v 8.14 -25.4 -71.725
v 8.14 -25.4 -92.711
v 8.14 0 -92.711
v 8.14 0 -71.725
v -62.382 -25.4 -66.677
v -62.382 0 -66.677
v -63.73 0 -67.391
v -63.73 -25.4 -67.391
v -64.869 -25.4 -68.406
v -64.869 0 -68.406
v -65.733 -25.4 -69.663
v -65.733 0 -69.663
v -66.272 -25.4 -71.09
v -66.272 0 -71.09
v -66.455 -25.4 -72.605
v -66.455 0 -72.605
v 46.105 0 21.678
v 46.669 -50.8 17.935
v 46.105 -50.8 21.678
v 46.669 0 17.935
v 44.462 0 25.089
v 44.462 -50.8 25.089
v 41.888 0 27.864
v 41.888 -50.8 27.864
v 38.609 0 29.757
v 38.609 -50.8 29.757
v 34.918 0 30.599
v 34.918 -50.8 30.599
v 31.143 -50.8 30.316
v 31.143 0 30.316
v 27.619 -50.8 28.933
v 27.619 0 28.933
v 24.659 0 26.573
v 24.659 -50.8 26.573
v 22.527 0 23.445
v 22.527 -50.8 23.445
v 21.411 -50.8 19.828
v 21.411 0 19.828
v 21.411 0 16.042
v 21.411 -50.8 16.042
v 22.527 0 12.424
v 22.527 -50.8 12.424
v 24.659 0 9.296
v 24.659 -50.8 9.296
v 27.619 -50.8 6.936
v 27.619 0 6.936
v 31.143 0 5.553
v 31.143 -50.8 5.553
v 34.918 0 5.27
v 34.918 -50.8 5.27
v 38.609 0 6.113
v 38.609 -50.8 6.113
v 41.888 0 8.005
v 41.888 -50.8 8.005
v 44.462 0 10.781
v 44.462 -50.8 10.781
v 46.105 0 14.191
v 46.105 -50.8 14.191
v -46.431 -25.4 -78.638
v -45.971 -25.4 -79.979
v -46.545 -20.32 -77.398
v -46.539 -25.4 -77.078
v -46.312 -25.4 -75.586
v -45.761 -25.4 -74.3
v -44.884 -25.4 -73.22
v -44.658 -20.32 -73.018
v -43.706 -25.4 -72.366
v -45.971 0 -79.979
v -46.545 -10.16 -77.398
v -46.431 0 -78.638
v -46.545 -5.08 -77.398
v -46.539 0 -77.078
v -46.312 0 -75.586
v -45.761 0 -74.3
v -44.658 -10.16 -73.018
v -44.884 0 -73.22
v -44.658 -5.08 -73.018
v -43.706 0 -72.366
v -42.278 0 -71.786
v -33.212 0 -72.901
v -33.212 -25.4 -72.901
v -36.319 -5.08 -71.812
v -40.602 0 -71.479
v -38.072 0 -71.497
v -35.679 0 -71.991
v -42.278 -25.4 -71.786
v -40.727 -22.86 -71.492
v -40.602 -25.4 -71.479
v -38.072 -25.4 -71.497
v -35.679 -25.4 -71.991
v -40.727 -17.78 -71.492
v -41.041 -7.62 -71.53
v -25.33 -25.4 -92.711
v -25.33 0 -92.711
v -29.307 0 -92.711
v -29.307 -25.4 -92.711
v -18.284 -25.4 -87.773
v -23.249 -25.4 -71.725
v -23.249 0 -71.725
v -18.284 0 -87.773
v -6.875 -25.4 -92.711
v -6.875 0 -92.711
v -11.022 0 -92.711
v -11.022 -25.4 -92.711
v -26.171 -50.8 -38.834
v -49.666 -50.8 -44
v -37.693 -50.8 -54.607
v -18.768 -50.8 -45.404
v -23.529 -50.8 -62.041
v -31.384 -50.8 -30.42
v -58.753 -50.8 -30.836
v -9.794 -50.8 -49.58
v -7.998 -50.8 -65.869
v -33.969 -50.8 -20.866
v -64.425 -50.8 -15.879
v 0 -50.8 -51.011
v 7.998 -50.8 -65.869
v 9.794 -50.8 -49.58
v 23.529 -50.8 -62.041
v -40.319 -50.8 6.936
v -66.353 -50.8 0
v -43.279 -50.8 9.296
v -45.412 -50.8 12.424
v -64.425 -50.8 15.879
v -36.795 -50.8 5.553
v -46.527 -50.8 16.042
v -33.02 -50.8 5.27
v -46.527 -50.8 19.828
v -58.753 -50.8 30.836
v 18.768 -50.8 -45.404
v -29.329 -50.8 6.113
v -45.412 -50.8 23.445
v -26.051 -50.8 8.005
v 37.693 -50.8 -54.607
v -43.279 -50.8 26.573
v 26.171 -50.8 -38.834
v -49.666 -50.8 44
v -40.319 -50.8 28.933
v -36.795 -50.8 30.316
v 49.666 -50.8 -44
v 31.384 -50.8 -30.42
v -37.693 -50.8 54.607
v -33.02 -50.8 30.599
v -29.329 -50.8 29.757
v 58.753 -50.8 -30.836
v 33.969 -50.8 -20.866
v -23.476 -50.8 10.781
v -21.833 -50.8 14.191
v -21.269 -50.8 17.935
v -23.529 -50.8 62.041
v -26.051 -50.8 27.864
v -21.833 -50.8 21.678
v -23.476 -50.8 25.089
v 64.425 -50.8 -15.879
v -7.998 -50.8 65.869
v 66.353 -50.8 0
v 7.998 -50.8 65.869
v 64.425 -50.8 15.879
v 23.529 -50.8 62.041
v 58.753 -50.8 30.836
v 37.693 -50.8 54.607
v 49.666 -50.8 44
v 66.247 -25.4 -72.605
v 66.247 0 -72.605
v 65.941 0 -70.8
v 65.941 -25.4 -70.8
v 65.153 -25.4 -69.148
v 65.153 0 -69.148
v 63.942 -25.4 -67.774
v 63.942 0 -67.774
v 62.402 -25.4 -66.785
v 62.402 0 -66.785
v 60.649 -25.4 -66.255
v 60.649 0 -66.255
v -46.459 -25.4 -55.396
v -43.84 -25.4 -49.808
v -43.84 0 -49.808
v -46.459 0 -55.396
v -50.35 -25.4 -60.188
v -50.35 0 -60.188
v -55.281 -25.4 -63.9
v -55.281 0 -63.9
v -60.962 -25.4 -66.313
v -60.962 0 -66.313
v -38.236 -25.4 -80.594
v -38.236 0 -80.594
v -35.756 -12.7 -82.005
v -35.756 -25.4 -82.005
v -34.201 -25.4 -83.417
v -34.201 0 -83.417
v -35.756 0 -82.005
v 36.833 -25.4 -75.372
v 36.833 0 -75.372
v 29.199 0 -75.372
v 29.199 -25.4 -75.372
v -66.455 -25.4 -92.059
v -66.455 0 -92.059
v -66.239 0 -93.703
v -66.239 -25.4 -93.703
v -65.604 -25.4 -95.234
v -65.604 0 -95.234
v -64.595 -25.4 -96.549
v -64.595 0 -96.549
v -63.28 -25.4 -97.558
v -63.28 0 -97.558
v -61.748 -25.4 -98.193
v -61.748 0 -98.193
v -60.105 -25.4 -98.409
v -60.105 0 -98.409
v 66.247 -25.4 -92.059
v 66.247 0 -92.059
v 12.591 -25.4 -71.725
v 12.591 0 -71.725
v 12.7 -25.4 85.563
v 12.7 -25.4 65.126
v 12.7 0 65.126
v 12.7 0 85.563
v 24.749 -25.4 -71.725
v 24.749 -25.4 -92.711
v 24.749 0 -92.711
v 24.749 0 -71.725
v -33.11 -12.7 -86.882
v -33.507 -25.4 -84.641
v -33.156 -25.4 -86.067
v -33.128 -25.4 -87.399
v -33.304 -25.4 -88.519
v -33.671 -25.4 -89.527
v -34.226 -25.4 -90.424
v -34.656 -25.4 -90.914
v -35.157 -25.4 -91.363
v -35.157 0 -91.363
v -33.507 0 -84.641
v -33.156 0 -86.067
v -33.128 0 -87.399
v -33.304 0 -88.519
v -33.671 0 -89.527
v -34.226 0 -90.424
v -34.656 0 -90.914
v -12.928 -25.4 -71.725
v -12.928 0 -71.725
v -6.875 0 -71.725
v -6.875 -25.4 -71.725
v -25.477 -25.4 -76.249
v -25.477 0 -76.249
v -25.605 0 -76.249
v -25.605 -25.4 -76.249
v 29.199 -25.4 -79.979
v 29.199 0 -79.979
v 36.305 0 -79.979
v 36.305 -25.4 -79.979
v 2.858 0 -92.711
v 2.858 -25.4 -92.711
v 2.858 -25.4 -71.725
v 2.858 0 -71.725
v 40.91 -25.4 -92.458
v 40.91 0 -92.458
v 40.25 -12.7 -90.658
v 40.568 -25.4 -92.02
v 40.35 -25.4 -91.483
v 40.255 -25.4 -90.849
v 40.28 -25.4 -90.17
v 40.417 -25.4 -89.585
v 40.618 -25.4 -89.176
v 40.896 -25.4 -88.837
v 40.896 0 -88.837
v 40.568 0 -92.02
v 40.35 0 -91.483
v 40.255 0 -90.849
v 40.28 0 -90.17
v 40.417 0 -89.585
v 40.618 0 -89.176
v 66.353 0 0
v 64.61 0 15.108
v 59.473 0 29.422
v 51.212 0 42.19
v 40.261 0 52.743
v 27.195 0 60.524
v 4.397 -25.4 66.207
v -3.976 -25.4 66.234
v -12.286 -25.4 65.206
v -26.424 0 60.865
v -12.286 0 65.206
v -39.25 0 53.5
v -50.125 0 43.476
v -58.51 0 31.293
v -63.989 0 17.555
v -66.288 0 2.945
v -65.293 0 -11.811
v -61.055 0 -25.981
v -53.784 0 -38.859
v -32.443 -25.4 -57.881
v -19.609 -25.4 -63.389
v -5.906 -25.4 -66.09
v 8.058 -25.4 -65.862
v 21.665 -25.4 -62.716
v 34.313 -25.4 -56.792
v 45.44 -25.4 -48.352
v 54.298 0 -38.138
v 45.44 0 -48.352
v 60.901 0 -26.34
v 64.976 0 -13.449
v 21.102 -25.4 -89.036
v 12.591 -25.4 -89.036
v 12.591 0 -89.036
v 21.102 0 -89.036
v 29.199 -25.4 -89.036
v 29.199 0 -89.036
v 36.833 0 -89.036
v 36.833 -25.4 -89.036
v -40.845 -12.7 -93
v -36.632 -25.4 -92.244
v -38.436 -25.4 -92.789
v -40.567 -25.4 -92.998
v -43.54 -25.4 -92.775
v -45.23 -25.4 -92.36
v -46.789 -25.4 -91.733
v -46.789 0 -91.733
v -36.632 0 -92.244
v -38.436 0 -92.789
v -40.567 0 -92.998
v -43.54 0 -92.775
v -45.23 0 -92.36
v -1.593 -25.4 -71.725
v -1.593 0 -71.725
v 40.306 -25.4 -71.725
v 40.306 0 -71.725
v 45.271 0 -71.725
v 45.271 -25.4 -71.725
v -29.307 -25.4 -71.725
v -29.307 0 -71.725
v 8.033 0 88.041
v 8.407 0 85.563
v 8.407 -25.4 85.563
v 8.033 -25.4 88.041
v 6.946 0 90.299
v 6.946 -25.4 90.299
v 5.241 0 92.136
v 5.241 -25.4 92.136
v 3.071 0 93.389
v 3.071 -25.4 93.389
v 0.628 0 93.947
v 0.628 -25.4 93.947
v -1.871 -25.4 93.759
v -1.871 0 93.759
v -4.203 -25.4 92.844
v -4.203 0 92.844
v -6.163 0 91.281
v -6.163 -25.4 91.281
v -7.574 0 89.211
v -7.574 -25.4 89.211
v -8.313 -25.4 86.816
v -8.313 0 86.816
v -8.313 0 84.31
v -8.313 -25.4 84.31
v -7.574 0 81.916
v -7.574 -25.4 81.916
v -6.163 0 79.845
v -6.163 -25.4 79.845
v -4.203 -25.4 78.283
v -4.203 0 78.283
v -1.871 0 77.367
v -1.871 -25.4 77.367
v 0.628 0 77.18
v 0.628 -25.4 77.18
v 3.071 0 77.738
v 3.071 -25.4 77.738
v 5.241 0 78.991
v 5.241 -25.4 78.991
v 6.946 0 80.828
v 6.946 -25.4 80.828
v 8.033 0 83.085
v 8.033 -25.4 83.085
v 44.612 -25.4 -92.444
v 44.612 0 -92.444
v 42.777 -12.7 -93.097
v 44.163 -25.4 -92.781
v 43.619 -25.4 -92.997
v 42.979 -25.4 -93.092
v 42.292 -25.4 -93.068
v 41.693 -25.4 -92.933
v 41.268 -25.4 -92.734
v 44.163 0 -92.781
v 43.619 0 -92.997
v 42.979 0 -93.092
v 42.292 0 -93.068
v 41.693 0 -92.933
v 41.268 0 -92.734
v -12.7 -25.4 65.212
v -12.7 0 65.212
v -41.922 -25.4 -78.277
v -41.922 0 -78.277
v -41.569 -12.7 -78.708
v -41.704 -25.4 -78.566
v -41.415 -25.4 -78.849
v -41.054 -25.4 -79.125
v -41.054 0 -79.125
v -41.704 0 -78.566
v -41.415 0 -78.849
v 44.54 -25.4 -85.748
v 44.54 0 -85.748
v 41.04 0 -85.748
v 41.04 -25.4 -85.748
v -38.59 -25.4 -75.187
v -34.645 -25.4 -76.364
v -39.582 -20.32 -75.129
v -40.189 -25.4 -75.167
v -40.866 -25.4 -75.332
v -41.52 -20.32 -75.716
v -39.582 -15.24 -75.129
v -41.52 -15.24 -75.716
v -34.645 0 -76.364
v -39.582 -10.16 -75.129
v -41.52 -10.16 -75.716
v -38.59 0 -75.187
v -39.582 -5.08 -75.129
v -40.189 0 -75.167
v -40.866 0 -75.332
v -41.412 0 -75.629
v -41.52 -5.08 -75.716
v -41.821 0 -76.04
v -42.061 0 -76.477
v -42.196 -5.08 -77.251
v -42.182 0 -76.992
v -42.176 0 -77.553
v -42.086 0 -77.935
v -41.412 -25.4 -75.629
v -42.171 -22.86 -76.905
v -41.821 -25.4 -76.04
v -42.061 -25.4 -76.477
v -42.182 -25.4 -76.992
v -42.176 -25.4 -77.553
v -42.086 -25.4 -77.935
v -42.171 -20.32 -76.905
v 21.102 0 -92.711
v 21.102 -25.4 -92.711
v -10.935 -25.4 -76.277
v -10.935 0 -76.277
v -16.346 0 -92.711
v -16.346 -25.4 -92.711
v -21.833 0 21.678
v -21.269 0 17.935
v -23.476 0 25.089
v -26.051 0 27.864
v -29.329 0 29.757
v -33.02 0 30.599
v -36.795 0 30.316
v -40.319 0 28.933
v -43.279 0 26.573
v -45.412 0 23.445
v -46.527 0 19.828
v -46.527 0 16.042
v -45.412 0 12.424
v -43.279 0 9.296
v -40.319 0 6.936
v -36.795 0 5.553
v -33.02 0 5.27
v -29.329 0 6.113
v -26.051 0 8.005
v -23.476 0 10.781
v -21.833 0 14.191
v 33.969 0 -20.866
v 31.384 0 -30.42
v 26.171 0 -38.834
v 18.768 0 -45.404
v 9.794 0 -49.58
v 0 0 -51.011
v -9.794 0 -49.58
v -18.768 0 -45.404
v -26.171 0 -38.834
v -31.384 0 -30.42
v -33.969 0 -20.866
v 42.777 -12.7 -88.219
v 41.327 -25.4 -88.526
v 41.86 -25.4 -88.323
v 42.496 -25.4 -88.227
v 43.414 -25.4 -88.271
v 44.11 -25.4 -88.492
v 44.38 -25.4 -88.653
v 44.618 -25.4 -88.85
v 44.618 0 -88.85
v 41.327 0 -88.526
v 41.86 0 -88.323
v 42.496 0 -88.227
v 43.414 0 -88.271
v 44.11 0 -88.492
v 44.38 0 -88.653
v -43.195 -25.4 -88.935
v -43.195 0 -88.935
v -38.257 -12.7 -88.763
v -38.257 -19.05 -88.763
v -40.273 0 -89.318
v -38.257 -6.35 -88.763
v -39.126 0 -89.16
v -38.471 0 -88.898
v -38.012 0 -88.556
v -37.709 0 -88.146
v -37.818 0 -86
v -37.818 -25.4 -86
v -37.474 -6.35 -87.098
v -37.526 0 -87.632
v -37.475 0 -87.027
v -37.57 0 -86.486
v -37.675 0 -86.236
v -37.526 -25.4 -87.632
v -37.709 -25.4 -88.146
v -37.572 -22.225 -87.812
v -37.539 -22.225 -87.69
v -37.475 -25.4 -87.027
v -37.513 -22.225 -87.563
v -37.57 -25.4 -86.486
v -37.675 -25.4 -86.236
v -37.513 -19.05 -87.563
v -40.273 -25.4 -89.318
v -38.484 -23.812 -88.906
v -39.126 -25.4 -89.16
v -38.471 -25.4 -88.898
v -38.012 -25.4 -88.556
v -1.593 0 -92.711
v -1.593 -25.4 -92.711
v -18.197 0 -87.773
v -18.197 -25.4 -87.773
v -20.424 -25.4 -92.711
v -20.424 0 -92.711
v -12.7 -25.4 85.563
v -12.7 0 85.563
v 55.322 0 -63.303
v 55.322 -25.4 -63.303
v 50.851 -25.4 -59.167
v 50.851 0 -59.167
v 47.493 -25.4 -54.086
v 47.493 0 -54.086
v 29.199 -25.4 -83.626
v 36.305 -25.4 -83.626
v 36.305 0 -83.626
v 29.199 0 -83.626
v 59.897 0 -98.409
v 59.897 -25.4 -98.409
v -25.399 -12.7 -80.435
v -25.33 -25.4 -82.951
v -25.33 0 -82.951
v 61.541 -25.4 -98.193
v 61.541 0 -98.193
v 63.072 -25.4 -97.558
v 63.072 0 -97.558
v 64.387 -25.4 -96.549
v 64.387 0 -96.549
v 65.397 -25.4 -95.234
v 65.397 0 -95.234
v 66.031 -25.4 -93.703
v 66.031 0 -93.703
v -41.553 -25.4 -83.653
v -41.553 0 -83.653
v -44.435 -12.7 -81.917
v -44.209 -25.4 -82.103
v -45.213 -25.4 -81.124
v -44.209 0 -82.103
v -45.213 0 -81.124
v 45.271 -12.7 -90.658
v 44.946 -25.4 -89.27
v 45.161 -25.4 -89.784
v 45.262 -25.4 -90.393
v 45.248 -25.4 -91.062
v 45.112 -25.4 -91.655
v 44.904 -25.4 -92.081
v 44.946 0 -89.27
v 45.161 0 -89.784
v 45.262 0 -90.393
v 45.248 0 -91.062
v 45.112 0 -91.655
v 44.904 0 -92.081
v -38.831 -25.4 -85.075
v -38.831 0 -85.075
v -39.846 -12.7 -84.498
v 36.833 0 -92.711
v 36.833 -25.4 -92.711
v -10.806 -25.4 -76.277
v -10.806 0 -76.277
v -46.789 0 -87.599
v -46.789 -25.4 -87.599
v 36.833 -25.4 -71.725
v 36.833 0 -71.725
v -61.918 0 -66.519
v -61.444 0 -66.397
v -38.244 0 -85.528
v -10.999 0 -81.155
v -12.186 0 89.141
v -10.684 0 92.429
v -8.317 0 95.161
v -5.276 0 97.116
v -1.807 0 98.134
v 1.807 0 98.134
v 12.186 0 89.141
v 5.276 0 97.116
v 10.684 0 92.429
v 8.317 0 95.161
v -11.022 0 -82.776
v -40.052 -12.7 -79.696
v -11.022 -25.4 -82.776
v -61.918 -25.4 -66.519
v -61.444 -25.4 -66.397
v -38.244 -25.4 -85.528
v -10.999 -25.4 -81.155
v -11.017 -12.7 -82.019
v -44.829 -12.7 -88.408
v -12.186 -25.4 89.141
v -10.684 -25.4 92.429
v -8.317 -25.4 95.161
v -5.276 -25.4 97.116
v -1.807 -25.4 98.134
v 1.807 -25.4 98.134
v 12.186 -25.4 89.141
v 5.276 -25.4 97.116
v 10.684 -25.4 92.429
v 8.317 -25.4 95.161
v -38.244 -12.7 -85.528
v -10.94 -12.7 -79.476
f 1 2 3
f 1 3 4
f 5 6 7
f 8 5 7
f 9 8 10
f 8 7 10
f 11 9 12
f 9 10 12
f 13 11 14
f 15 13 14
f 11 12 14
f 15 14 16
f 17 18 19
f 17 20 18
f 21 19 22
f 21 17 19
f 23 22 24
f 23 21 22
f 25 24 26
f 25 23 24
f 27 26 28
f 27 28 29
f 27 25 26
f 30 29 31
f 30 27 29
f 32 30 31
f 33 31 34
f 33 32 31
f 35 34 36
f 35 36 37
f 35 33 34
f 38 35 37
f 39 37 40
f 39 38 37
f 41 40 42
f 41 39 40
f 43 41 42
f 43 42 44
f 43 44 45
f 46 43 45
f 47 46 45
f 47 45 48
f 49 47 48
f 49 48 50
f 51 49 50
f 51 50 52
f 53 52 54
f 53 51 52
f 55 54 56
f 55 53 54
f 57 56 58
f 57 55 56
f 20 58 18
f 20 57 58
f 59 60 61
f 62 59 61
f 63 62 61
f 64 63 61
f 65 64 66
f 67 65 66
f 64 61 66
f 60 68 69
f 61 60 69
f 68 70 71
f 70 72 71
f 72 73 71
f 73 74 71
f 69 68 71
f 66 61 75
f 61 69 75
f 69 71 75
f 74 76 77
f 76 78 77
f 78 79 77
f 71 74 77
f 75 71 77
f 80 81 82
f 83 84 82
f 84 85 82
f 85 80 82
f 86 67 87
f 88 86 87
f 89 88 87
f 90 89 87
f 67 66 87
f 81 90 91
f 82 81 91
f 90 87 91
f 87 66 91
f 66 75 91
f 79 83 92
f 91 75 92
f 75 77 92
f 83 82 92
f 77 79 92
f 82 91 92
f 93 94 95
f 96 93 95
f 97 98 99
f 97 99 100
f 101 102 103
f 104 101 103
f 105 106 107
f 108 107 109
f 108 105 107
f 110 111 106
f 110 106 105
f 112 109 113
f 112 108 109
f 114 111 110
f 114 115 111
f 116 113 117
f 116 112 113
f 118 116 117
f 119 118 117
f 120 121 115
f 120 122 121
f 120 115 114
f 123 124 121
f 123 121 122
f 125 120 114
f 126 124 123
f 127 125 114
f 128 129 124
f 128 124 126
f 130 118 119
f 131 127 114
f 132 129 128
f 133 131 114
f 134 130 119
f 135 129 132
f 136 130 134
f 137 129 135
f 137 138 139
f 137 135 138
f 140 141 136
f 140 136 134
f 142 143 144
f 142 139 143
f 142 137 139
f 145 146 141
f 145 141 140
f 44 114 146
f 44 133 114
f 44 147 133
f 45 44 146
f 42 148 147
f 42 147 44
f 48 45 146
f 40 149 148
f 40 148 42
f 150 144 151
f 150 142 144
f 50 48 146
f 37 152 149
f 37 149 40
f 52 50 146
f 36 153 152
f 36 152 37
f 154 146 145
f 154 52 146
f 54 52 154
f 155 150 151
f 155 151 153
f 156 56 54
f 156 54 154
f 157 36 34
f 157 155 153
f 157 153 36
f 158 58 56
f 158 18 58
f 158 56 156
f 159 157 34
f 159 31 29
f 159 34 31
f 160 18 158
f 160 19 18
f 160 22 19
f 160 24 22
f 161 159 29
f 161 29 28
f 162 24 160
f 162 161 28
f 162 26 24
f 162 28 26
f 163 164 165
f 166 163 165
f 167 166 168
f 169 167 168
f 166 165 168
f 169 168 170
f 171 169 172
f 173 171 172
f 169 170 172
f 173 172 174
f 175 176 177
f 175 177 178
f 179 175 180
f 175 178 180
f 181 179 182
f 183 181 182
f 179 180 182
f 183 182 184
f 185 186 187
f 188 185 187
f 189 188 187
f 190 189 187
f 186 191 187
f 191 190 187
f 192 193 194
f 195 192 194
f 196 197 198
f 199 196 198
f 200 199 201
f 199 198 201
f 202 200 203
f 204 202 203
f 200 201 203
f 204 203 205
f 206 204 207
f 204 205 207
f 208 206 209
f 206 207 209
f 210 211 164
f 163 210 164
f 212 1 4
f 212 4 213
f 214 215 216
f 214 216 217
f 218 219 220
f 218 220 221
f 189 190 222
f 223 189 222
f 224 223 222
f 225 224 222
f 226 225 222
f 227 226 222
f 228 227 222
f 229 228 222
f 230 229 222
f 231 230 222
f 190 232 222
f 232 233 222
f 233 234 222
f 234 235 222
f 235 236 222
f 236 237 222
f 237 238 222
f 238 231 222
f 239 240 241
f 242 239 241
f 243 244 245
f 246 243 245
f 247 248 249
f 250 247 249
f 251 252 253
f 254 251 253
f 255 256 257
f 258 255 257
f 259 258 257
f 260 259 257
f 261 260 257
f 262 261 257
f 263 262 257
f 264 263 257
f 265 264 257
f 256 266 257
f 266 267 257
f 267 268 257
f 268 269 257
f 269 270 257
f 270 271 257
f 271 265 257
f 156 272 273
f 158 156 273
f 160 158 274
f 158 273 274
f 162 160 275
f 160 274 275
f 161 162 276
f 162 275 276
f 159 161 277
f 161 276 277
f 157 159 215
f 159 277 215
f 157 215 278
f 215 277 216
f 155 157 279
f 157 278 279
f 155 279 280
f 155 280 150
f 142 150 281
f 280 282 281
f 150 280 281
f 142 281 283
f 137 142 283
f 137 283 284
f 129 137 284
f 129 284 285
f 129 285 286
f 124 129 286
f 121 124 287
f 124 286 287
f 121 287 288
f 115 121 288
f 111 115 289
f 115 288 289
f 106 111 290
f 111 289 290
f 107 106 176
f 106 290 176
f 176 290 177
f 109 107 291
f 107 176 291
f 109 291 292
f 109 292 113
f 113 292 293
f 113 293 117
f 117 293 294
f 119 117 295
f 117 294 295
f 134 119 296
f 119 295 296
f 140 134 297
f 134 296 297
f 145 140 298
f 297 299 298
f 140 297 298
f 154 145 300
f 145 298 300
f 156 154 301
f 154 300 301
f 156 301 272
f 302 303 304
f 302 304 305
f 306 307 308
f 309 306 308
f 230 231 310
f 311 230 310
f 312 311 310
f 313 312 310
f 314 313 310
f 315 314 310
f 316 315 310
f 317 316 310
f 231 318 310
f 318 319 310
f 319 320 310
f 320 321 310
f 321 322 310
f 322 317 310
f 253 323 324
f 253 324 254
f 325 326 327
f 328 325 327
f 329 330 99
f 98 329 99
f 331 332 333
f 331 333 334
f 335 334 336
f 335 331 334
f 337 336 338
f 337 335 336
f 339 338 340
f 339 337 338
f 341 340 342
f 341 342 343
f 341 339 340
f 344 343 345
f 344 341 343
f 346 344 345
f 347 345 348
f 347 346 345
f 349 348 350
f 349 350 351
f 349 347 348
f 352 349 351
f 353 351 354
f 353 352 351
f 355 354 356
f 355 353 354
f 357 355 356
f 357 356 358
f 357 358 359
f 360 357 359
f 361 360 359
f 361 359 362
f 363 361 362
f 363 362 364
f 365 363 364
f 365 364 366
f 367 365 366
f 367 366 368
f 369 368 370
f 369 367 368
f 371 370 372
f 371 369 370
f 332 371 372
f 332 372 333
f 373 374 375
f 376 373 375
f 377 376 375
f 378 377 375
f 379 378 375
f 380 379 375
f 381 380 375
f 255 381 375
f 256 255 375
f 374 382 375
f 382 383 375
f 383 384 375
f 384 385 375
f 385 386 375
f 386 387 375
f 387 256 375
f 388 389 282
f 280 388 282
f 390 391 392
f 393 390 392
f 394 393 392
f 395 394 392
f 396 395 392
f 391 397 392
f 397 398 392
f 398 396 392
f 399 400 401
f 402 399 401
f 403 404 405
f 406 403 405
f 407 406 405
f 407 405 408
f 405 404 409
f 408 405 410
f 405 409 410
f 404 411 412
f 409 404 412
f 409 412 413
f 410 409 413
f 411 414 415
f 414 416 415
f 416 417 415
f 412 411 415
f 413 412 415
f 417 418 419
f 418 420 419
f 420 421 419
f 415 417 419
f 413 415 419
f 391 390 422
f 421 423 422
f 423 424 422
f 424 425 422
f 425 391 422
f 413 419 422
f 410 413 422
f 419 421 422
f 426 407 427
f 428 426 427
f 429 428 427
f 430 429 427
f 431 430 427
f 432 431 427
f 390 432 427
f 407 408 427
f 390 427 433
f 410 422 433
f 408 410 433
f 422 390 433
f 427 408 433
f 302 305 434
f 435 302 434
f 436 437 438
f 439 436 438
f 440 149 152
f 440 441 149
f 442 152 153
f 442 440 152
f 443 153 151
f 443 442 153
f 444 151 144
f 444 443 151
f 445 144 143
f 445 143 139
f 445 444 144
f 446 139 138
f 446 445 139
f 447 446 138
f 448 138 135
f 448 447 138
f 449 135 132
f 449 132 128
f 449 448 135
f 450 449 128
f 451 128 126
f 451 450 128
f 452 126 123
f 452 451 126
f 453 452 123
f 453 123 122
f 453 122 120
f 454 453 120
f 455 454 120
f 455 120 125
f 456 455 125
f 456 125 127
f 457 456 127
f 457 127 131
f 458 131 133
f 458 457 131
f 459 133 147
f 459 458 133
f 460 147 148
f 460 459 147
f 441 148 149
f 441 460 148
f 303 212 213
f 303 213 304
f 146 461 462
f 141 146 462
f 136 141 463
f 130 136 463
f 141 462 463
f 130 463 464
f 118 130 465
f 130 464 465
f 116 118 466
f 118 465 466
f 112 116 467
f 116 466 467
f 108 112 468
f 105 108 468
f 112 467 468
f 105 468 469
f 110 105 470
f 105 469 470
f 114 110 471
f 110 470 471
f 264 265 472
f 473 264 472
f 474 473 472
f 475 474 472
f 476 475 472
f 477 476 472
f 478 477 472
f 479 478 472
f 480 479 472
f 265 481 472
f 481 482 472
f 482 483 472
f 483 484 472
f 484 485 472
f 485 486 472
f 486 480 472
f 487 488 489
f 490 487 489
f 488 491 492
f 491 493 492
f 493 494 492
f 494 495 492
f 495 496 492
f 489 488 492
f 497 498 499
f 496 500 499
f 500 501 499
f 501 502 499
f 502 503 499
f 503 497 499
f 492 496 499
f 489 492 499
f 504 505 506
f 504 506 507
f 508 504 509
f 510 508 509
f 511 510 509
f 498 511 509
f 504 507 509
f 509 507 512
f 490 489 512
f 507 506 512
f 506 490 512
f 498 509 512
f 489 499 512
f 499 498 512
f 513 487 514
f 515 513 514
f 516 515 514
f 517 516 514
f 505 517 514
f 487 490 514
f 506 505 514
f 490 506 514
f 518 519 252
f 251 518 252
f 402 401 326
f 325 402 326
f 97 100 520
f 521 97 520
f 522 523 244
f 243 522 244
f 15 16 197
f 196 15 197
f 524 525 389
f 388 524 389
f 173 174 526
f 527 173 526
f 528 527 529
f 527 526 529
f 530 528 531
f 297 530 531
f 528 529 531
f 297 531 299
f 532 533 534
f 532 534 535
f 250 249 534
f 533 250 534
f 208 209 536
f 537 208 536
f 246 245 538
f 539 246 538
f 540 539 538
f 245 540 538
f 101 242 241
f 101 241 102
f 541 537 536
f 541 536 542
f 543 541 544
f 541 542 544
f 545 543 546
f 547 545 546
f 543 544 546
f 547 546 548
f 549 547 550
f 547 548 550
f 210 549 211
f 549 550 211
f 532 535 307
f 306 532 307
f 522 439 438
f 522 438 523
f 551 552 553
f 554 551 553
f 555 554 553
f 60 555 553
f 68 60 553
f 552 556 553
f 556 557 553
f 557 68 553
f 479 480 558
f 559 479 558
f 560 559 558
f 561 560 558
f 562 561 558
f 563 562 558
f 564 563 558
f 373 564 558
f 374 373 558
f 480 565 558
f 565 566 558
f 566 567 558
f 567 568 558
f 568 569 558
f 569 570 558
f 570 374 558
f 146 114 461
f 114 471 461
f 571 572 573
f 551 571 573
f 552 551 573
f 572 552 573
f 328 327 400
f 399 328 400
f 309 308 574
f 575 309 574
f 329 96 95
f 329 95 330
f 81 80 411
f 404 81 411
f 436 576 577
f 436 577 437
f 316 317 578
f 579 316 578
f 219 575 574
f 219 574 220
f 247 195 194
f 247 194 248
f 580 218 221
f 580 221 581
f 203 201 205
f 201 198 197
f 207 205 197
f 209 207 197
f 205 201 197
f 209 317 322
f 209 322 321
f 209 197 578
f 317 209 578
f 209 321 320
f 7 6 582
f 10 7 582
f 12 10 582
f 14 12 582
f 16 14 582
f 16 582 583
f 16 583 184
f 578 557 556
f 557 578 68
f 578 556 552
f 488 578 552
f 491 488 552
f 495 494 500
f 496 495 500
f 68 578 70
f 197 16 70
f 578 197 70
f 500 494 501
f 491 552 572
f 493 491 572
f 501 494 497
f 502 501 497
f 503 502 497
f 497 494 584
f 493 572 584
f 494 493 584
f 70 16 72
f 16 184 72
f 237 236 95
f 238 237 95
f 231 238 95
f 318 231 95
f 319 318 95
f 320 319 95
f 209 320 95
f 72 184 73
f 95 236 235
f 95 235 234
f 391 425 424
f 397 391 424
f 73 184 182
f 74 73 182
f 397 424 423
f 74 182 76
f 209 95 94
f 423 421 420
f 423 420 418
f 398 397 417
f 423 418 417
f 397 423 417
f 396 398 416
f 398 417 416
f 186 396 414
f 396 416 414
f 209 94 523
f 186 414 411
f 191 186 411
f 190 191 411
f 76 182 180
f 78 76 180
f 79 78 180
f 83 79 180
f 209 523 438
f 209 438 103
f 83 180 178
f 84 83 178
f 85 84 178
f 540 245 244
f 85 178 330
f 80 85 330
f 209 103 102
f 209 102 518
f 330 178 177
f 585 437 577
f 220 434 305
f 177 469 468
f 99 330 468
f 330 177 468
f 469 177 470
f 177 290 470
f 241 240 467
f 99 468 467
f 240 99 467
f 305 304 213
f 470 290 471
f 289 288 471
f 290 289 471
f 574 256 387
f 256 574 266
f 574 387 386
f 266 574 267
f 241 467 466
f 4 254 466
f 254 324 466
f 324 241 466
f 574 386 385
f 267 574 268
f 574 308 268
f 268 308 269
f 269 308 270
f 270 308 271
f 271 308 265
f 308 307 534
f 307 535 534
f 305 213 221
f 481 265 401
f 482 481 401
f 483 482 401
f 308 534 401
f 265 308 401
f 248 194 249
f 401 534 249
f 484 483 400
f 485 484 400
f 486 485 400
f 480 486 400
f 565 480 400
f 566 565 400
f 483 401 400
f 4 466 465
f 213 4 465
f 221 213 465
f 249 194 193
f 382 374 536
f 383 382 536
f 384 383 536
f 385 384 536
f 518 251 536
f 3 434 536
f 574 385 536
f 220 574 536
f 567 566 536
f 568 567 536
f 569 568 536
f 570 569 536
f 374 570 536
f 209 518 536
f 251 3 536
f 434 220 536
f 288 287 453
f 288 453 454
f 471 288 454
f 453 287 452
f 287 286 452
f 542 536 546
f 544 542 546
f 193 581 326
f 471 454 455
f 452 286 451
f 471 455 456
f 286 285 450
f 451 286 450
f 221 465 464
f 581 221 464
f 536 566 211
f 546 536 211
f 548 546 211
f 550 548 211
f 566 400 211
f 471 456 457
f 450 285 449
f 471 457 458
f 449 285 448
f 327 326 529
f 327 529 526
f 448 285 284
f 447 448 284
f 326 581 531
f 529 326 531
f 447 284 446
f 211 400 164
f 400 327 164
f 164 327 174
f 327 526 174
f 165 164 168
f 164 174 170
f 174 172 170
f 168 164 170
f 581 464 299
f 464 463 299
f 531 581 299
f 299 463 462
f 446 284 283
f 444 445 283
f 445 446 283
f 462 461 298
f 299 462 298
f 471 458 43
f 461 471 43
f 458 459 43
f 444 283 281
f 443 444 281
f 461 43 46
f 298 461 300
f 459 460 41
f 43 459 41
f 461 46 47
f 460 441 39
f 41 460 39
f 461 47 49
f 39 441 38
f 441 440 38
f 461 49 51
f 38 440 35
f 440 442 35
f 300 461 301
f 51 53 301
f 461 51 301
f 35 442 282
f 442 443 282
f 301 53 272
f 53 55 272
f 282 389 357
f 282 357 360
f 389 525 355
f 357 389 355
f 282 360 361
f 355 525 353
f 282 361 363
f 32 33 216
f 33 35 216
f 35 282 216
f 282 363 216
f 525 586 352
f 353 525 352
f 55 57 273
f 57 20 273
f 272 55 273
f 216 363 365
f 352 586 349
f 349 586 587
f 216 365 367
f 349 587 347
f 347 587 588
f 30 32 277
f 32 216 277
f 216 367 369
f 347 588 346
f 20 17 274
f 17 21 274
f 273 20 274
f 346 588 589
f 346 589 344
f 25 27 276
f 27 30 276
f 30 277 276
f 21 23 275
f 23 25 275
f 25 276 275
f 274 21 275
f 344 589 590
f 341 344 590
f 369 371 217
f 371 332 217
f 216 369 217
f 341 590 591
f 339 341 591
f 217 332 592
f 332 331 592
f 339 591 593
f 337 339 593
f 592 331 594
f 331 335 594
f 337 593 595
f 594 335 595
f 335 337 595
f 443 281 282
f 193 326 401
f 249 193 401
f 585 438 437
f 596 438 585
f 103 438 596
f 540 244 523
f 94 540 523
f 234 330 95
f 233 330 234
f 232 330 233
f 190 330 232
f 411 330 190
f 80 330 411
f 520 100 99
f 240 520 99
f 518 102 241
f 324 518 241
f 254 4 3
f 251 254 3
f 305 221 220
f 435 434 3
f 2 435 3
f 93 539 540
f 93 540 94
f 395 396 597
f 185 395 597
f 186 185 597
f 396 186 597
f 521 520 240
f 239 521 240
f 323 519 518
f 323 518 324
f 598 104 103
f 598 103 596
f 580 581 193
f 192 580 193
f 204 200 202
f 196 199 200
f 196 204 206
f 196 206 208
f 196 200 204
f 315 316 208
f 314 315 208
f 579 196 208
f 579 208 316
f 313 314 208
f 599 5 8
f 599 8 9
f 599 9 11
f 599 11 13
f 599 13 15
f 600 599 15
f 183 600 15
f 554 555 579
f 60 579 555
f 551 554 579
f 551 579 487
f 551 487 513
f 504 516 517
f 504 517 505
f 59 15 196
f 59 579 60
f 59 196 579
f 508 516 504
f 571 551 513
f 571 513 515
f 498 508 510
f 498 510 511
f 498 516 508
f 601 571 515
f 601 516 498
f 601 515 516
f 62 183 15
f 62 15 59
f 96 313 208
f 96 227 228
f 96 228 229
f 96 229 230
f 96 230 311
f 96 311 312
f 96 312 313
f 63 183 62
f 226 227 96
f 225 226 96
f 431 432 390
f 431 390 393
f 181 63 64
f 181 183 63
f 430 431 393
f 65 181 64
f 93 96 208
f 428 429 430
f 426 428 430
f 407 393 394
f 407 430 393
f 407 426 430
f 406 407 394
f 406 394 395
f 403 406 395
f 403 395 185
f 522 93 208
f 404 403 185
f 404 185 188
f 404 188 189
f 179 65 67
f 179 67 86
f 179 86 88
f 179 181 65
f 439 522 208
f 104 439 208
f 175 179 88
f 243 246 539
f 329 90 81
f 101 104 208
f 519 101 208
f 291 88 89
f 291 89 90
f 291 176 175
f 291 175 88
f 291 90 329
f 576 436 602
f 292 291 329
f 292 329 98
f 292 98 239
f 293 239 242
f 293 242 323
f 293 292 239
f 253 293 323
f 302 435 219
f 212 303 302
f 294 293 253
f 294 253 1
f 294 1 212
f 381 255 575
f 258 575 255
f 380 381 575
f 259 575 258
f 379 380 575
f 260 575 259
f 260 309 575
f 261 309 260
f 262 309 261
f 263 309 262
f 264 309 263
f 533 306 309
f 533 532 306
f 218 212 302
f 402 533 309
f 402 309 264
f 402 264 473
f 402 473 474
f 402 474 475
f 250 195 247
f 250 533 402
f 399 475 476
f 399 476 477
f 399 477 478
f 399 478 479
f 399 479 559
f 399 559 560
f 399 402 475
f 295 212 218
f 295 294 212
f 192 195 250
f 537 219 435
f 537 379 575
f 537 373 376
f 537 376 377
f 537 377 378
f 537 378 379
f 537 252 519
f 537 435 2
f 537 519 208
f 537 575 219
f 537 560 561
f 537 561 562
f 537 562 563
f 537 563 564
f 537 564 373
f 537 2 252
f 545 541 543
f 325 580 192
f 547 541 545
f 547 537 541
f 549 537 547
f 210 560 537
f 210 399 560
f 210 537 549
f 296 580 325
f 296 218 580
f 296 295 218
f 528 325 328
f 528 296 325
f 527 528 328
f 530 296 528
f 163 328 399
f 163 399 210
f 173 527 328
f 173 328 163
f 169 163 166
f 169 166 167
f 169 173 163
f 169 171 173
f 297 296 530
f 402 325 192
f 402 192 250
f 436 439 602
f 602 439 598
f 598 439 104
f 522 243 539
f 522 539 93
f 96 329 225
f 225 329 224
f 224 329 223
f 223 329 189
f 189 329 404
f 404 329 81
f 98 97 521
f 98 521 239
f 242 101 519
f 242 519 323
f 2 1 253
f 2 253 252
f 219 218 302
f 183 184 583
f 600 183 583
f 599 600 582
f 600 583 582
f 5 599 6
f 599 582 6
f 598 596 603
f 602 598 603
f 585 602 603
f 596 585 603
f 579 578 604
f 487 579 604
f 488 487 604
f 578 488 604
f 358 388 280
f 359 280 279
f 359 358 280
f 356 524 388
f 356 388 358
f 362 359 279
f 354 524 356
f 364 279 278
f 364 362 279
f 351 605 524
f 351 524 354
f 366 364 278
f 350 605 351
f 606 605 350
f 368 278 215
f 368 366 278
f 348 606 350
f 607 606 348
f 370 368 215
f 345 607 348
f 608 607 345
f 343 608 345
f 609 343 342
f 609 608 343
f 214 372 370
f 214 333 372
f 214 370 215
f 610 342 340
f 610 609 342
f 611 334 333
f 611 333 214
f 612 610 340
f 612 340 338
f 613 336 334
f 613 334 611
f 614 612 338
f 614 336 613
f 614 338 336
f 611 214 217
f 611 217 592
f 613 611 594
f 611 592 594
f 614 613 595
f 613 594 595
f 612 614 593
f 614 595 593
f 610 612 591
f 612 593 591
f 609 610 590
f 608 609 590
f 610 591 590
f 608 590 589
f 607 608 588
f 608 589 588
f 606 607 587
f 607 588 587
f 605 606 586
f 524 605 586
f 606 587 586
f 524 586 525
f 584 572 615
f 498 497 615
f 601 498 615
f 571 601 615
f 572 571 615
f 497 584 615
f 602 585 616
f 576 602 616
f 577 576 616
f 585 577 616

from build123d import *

# Parameters (mm, degrees)
F0_R         = 66.3530558333
F0_R_2       = 12.7
F1_DEPTH     = 25.4
F1_FACE_R    = 66.3530558333
F1_FACE_R_2  = 12.7
F1_FACE1_R   = 66.3530558333
F1_FACE1_R_2 = 12.7
F2_W         = 4.4507078564
F2_H         = 20.9858454036
F2_R         = 8.4066819866
F3_DEPTH     = 25.4


with BuildPart() as f1:
    # F0 (on Front) → F1 (new body)
    with BuildSketch(Plane.XZ):
        Circle(F0_R)
        with BuildLine():
            ThreePointArc((33.9692530815, -20.8659172058), (0, -51.0114037039), (-33.9692530815, -20.8659172058))
            Line((-33.9692530815, -20.8659172058), (33.9692530815, -20.8659172058))
        make_face(mode=Mode.SUBTRACT)
        with Locations((-33.9692530815, 17.9346787966)):
            Circle(F0_R_2, mode=Mode.SUBTRACT)
        with Locations((33.9692530815, 17.9346787966)):
            Circle(F0_R_2, mode=Mode.SUBTRACT)
    extrude(amount=F1_DEPTH)

    # F1_face (on face) + F1_face1 (on face) + F2 (on Front) → F3 (join)
    with BuildSketch(Plane(origin=(0, -25.4, 3.0362688443), x_dir=(1, 0, 0), z_dir=(0, -1, 0))):
        with Locations((0, -3.0362688443)):
            Circle(F1_FACE_R)
        with BuildLine():
            Line((-33.9692530815, -23.9021860501), (33.9692530815, -23.9021860501))
            ThreePointArc((33.9692530815, -23.9021860501), (0, -54.0476725482), (-33.9692530815, -23.9021860501))
        make_face(mode=Mode.SUBTRACT)
        with Locations((-33.9692530815, 14.8984099523)):
            Circle(F1_FACE_R_2, mode=Mode.SUBTRACT)
        with Locations((33.9692530815, 14.8984099523)):
            Circle(F1_FACE_R_2, mode=Mode.SUBTRACT)
    with BuildSketch(Plane(origin=(0, 0, 3.0362688443), x_dir=(1, 0, 0), z_dir=(0, 1, 0))):
        with Locations((0, 3.0362688443)):
            Circle(F1_FACE1_R)
        with BuildLine():
            Line((33.9692530815, 23.9021860501), (-33.9692530815, 23.9021860501))
            ThreePointArc((-33.9692530815, 23.9021860501), (0, 54.0476725482), (33.9692530815, 23.9021860501))
        make_face(mode=Mode.SUBTRACT)
        with Locations((-33.9692530815, -14.8984099523)):
            Circle(F1_FACE1_R_2, mode=Mode.SUBTRACT)
        with Locations((33.9692530815, -14.8984099523)):
            Circle(F1_FACE1_R_2, mode=Mode.SUBTRACT)
    with BuildSketch(Plane.XZ):
        with BuildLine():
            ThreePointArc((-62.3816600836, -66.6768364352), (-65.3384644923, -69.0084552345), (-66.4549320936, -72.6046530366))
            Line((-66.4549320936, -72.6046530366), (-66.4549320936, -92.0591460705))
            ThreePointArc((-66.4549320936, -92.0591460705), (-64.5950601542, -96.549274131), (-60.1049320936, -98.4091460705))
            Line((-60.1049320936, -98.4091460705), (59.8973428065, -98.4091460705))
            ThreePointArc((59.8973428065, -98.4091460705), (64.387470867, -96.549274131), (66.2473428065, -92.0591460705))
            Line((66.2473428065, -92.0591460705), (66.2473428065, -72.6046530366))
            ThreePointArc((66.2473428065, -72.6046530366), (64.5949199756, -68.4188649341), (60.649351561, -66.2546530366))
            Line((60.649351561, -66.2546530366), (58.6019530892, -66.2546530366))
            Line((58.6019530892, -66.2546530366), (-60.1049320936, -66.2546530366))
            ThreePointArc((-60.1049320936, -66.2546530366), (-60.5342273612, -66.2691810279), (-60.9615582829, -66.3126985253))
            ThreePointArc((-60.9615582829, -66.3126985253), (-61.6689814595, -66.5050153427), (-62.3816600836, -66.6768364352))
        make_face()
        with BuildLine():
            add(Edge.make_bspline(
                [(-34.2013412228, -83.4167571957), (-33.1104814541, -84.8291335278), (-33.1104814541, -86.8822464399)],
                knots=[0, 0, 0, 1, 1, 1], degree=2))
            add(Edge.make_bspline(
                [(-33.1104814541, -86.8822464399), (-33.1104814541, -89.7253714793), (-35.1567047255, -91.3628094058)],
                knots=[0, 0, 0, 1, 1, 1], degree=2))
            add(Edge.make_bspline(
                [(-35.1567047255, -91.3628094058), (-37.202927997, -93.0002473324), (-40.8452513511, -93.0002473324)],
                knots=[0, 0, 0, 1, 1, 1], degree=2))
            add(Edge.make_bspline(
                [(-40.8452513511, -93.0002473324), (-44.2073959857, -93.0002473324), (-46.7887146806, -91.7325534538)],
                knots=[0, 0, 0, 1, 1, 1], degree=2))
            Line((-46.7887146806, -91.7325534538), (-46.7887146806, -87.598769067))
            add(Edge.make_bspline(
                [(-46.7887146806, -87.598769067), (-44.666705362, -88.5495394759), (-43.194618811, -88.935359352)],
                knots=[0, 0, 0, 1, 1, 1], degree=2))
            add(Edge.make_bspline(
                [(-43.194618811, -88.935359352), (-41.7225322599, -89.3211792281), (-40.5007693189, -89.3211792281)],
                knots=[0, 0, 0, 1, 1, 1], degree=2))
            add(Edge.make_bspline(
                [(-40.5007693189, -89.3211792281), (-39.0401655022, -89.3211792281), (-38.2570430156, -88.7631183359)],
                knots=[0, 0, 0, 1, 1, 1], degree=2))
            add(Edge.make_bspline(
                [(-38.2570430156, -88.7631183359), (-37.473920529, -88.2050574437), (-37.473920529, -87.0981218468)],
                knots=[0, 0, 0, 1, 1, 1], degree=2))
            add(Edge.make_bspline(
                [(-37.473920529, -87.0981218468), (-37.473920529, -86.4826472825), (-37.8184025612, -86.0003724374)],
                knots=[0, 0, 0, 1, 1, 1], degree=2))
            add(Edge.make_bspline(
                [(-37.8184025612, -86.0003724374), (-38.1628845935, -85.5180975923), (-38.831179736, -85.0748640441)],
                knots=[0, 0, 0, 1, 1, 1], degree=2))
            add(Edge.make_bspline(
                [(-38.831179736, -85.0748640441), (-39.4994748785, -84.631630496), (-41.5525877906, -83.6533015245)],
                knots=[0, 0, 0, 1, 1, 1], degree=2))
            add(Edge.make_bspline(
                [(-41.5525877906, -83.6533015245), (-43.4725009836, -82.7484620531), (-44.434754127, -81.917112082)],
                knots=[0, 0, 0, 1, 1, 1], degree=2))
            add(Edge.make_bspline(
                [(-44.434754127, -81.917112082), (-45.3970072704, -81.0857621109), (-45.9711439908, -79.978826514)],
                knots=[0, 0, 0, 1, 1, 1], degree=2))
            add(Edge.make_bspline(
                [(-45.9711439908, -79.978826514), (-46.5452807111, -78.8718909171), (-46.5452807111, -77.3975078191)],
                knots=[0, 0, 0, 1, 1, 1], degree=2))
            add(Edge.make_bspline(
                [(-46.5452807111, -77.3975078191), (-46.5452807111, -74.6094999049), (-44.6575191745, -73.017992916)],
                knots=[0, 0, 0, 1, 1, 1], degree=2))
            add(Edge.make_bspline(
                [(-44.6575191745, -73.017992916), (-42.7697576379, -71.4264859271), (-39.4397646596, -71.4264859271)],
                knots=[0, 0, 0, 1, 1, 1], degree=2))
            add(Edge.make_bspline(
                [(-39.4397646596, -71.4264859271), (-37.80462328, -71.4264859271), (-36.3187574476, -71.8123058032)],
                knots=[0, 0, 0, 1, 1, 1], degree=2))
            add(Edge.make_bspline(
                [(-36.3187574476, -71.8123058032), (-34.8328916152, -72.1981256793), (-33.2115295168, -72.900869025)],
                knots=[0, 0, 0, 1, 1, 1], degree=2))
            Line((-33.2115295168, -72.900869025), (-34.6445747709, -76.3640617224))
            add(Edge.make_bspline(
                [(-34.6445747709, -76.3640617224), (-36.3256470882, -75.6750976579), (-37.4233964976, -75.401808579)],
                knots=[0, 0, 0, 1, 1, 1], degree=2))
            add(Edge.make_bspline(
                [(-37.4233964976, -75.401808579), (-38.521145907, -75.1285195001), (-39.5821505663, -75.1285195001)],
                knots=[0, 0, 0, 1, 1, 1], degree=2))
            add(Edge.make_bspline(
                [(-39.5821505663, -75.1285195001), (-40.8452513511, -75.1285195001), (-41.5204361343, -75.7164355018)],
                knots=[0, 0, 0, 1, 1, 1], degree=2))
            add(Edge.make_bspline(
                [(-41.5204361343, -75.7164355018), (-42.1956209175, -76.3043515035), (-42.1956209175, -77.2505288187)],
                knots=[0, 0, 0, 1, 1, 1], degree=2))
            add(Edge.make_bspline(
                [(-42.1956209175, -77.2505288187), (-42.1956209175, -77.8384448204), (-41.9223318386, -78.2770852747)],
                knots=[0, 0, 0, 1, 1, 1], degree=2))
            add(Edge.make_bspline(
                [(-41.9223318386, -78.2770852747), (-41.6490427597, -78.7157257291), (-41.0542371174, -79.124511074)],
                knots=[0, 0, 0, 1, 1, 1], degree=2))
            add(Edge.make_bspline(
                [(-41.0542371174, -79.124511074), (-40.459431475, -79.533296419), (-38.2363740937, -80.5943010782)],
                knots=[0, 0, 0, 1, 1, 1], degree=2))
            add(Edge.make_bspline(
                [(-38.2363740937, -80.5943010782), (-35.2922009915, -82.0043808635), (-34.2013412228, -83.4167571957)],
                knots=[0, 0, 0, 1, 1, 1], degree=2))
        make_face(mode=Mode.SUBTRACT)
        with BuildLine():
            Line((-16.3456892187, -92.7108824253), (-20.4243564804, -92.7108824253))
            Line((-20.4243564804, -92.7108824253), (-25.4767596198, -76.2492343783))
            Line((-25.4767596198, -76.2492343783), (-25.6053662451, -76.2492343783))
            add(Edge.make_bspline(
                [(-25.6053662451, -76.2492343783), (-25.3297806194, -81.2694858614), (-25.3297806194, -82.9505581787)],
                knots=[0, 0, 0, 1, 1, 1], degree=2))
            Line((-25.3297806194, -82.9505581787), (-25.3297806194, -92.7108824253))
            Line((-25.3297806194, -92.7108824253), (-29.3073998182, -92.7108824253))
            Line((-29.3073998182, -92.7108824253), (-29.3073998182, -71.7250370217))
            Line((-29.3073998182, -71.7250370217), (-23.2491091447, -71.7250370217))
            Line((-23.2491091447, -71.7250370217), (-18.2839747868, -87.77330663))
            Line((-18.2839747868, -87.77330663), (-18.1967060053, -87.77330663))
            Line((-18.1967060053, -87.77330663), (-12.928427459, -71.7250370217))
            Line((-12.928427459, -71.7250370217), (-6.8747298792, -71.7250370217))
            Line((-6.8747298792, -71.7250370217), (-6.8747298792, -92.7108824253))
            Line((-6.8747298792, -92.7108824253), (-11.0222935473, -92.7108824253))
            Line((-11.0222935473, -92.7108824253), (-11.0222935473, -82.7760206157))
            add(Edge.make_bspline(
                [(-11.0222935473, -82.7760206157), (-11.0222935473, -82.07327727), (-10.9993280785, -81.1546585173)],
                knots=[0, 0, 0, 1, 1, 1], degree=2))
            add(Edge.make_bspline(
                [(-10.9993280785, -81.1546585173), (-10.9763626097, -80.2360397647), (-10.8064181404, -76.2767929409)],
                knots=[0, 0, 0, 1, 1, 1], degree=2))
            Line((-10.8064181404, -76.2767929409), (-10.9350247658, -76.2767929409))
            Line((-10.9350247658, -76.2767929409), (-16.3456892187, -92.7108824253))
        make_face(mode=Mode.SUBTRACT)
        with Locations((0.6326818766, -82.2179597235)):
            Rectangle(F2_W, F2_H, mode=Mode.SUBTRACT)
        Polygon((21.1018042319, -92.7108824253), (8.1400936324, -92.7108824253), (8.1400936324, -71.7250370217), (12.5908014888, -71.7250370217), (12.5908014888, -89.0364074148), (21.1018042319, -89.0364074148), align=None, mode=Mode.SUBTRACT)
        Polygon((36.8331503705, -89.0364074148), (36.8331503705, -92.7108824253), (24.7487206798, -92.7108824253), (24.7487206798, -71.7250370217), (36.8331503705, -71.7250370217), (36.8331503705, -75.3719534696), (29.1994285362, -75.3719534696), (29.1994285362, -79.978826514), (36.3049445878, -79.978826514), (36.3049445878, -83.6257429619), (29.1994285362, -83.6257429619), (29.1994285362, -89.0364074148), align=None, mode=Mode.SUBTRACT)
        with BuildLine():
            add(Edge.make_bspline(
                [(40.9095210853, -92.4582622683), (40.2504121303, -91.8198222353), (40.2504121303, -90.6577695132)],
                knots=[0, 0, 0, 1, 1, 1], degree=2))
            add(Edge.make_bspline(
                [(40.2504121303, -90.6577695132), (40.2504121303, -89.4543789473), (40.895741804, -88.8366078361)],
                knots=[0, 0, 0, 1, 1, 1], degree=2))
            add(Edge.make_bspline(
                [(40.895741804, -88.8366078361), (41.5410714777, -88.218836725), (42.7766137, -88.218836725)],
                knots=[0, 0, 0, 1, 1, 1], degree=2))
            add(Edge.make_bspline(
                [(42.7766137, -88.218836725), (43.9662249846, -88.218836725), (44.618444299, -88.8503871174)],
                knots=[0, 0, 0, 1, 1, 1], degree=2))
            add(Edge.make_bspline(
                [(44.618444299, -88.8503871174), (45.2706636133, -89.4819375098), (45.2706636133, -90.6577695132)],
                knots=[0, 0, 0, 1, 1, 1], degree=2))
            add(Edge.make_bspline(
                [(45.2706636133, -90.6577695132), (45.2706636133, -91.7922636727), (44.6115546583, -92.444482987)],
                knots=[0, 0, 0, 1, 1, 1], degree=2))
            add(Edge.make_bspline(
                [(44.6115546583, -92.444482987), (43.9524457033, -93.0967023014), (42.7766137, -93.0967023014)],
                knots=[0, 0, 0, 1, 1, 1], degree=2))
            add(Edge.make_bspline(
                [(42.7766137, -93.0967023014), (41.5686300403, -93.0967023014), (40.9095210853, -92.4582622683)],
                knots=[0, 0, 0, 1, 1, 1], degree=2))
        make_face(mode=Mode.SUBTRACT)
        Polygon((45.2706636133, -71.7250370217), (44.540361705, -85.7477522804), (41.0404242575, -85.7477522804), (40.3055292554, -71.7250370217), align=None, mode=Mode.SUBTRACT)
        with BuildLine():
            ThreePointArc((-60.9615582829, -66.3126985253), (-61.6821531332, -66.4536471195), (-62.3816600836, -66.6768364352))
            ThreePointArc((-62.3816600836, -66.6768364352), (-61.6689814595, -66.5050153427), (-60.9615582829, -66.3126985253))
        make_face()
        with BuildLine():
            ThreePointArc((-43.0171898532, -46.6046780348), (-49.1966681067, -59.0014776338), (-60.9615582829, -66.3126985253))
            ThreePointArc((-60.9615582829, -66.3126985253), (-60.5342273612, -66.2691810279), (-60.1049320936, -66.2546530366))
            Line((-60.1049320936, -66.2546530366), (58.6019530892, -66.2546530366))
            ThreePointArc((58.6019530892, -66.2546530366), (59.6256523251, -66.1750785354), (60.649351561, -66.2546530366))
            ThreePointArc((60.649351561, -66.2546530366), (50.2869781412, -58.4792403386), (45.107152313, -46.6046780348))
            Line((45.107152313, -46.6046780348), (0, -60.4971349239))
            Line((0, -60.4971349239), (-43.0171898532, -46.6046780348))
        make_face()
        with BuildLine():
            ThreePointArc((60.649351561, -66.2546530366), (59.6256523251, -66.1750785354), (58.6019530892, -66.2546530366))
            Line((58.6019530892, -66.2546530366), (60.649351561, -66.2546530366))
        make_face()
        with BuildLine():
            Line((-12.7, 85.5633541942), (-12.7, 65.2124211192))
            Line((-12.7, 65.2124211192), (12.7, 64.8053959012))
            Line((12.7, 64.8053959012), (12.7, 85.5633541942))
            ThreePointArc((12.7, 85.5633541942), (0, 98.2633541942), (-12.7, 85.5633541942))
        make_face()
        with Locations((0, 85.5633541942)):
            Circle(F2_R, mode=Mode.SUBTRACT)
    extrude(amount=F3_DEPTH, dir=(0, -1, 0))


solid = f1.part
